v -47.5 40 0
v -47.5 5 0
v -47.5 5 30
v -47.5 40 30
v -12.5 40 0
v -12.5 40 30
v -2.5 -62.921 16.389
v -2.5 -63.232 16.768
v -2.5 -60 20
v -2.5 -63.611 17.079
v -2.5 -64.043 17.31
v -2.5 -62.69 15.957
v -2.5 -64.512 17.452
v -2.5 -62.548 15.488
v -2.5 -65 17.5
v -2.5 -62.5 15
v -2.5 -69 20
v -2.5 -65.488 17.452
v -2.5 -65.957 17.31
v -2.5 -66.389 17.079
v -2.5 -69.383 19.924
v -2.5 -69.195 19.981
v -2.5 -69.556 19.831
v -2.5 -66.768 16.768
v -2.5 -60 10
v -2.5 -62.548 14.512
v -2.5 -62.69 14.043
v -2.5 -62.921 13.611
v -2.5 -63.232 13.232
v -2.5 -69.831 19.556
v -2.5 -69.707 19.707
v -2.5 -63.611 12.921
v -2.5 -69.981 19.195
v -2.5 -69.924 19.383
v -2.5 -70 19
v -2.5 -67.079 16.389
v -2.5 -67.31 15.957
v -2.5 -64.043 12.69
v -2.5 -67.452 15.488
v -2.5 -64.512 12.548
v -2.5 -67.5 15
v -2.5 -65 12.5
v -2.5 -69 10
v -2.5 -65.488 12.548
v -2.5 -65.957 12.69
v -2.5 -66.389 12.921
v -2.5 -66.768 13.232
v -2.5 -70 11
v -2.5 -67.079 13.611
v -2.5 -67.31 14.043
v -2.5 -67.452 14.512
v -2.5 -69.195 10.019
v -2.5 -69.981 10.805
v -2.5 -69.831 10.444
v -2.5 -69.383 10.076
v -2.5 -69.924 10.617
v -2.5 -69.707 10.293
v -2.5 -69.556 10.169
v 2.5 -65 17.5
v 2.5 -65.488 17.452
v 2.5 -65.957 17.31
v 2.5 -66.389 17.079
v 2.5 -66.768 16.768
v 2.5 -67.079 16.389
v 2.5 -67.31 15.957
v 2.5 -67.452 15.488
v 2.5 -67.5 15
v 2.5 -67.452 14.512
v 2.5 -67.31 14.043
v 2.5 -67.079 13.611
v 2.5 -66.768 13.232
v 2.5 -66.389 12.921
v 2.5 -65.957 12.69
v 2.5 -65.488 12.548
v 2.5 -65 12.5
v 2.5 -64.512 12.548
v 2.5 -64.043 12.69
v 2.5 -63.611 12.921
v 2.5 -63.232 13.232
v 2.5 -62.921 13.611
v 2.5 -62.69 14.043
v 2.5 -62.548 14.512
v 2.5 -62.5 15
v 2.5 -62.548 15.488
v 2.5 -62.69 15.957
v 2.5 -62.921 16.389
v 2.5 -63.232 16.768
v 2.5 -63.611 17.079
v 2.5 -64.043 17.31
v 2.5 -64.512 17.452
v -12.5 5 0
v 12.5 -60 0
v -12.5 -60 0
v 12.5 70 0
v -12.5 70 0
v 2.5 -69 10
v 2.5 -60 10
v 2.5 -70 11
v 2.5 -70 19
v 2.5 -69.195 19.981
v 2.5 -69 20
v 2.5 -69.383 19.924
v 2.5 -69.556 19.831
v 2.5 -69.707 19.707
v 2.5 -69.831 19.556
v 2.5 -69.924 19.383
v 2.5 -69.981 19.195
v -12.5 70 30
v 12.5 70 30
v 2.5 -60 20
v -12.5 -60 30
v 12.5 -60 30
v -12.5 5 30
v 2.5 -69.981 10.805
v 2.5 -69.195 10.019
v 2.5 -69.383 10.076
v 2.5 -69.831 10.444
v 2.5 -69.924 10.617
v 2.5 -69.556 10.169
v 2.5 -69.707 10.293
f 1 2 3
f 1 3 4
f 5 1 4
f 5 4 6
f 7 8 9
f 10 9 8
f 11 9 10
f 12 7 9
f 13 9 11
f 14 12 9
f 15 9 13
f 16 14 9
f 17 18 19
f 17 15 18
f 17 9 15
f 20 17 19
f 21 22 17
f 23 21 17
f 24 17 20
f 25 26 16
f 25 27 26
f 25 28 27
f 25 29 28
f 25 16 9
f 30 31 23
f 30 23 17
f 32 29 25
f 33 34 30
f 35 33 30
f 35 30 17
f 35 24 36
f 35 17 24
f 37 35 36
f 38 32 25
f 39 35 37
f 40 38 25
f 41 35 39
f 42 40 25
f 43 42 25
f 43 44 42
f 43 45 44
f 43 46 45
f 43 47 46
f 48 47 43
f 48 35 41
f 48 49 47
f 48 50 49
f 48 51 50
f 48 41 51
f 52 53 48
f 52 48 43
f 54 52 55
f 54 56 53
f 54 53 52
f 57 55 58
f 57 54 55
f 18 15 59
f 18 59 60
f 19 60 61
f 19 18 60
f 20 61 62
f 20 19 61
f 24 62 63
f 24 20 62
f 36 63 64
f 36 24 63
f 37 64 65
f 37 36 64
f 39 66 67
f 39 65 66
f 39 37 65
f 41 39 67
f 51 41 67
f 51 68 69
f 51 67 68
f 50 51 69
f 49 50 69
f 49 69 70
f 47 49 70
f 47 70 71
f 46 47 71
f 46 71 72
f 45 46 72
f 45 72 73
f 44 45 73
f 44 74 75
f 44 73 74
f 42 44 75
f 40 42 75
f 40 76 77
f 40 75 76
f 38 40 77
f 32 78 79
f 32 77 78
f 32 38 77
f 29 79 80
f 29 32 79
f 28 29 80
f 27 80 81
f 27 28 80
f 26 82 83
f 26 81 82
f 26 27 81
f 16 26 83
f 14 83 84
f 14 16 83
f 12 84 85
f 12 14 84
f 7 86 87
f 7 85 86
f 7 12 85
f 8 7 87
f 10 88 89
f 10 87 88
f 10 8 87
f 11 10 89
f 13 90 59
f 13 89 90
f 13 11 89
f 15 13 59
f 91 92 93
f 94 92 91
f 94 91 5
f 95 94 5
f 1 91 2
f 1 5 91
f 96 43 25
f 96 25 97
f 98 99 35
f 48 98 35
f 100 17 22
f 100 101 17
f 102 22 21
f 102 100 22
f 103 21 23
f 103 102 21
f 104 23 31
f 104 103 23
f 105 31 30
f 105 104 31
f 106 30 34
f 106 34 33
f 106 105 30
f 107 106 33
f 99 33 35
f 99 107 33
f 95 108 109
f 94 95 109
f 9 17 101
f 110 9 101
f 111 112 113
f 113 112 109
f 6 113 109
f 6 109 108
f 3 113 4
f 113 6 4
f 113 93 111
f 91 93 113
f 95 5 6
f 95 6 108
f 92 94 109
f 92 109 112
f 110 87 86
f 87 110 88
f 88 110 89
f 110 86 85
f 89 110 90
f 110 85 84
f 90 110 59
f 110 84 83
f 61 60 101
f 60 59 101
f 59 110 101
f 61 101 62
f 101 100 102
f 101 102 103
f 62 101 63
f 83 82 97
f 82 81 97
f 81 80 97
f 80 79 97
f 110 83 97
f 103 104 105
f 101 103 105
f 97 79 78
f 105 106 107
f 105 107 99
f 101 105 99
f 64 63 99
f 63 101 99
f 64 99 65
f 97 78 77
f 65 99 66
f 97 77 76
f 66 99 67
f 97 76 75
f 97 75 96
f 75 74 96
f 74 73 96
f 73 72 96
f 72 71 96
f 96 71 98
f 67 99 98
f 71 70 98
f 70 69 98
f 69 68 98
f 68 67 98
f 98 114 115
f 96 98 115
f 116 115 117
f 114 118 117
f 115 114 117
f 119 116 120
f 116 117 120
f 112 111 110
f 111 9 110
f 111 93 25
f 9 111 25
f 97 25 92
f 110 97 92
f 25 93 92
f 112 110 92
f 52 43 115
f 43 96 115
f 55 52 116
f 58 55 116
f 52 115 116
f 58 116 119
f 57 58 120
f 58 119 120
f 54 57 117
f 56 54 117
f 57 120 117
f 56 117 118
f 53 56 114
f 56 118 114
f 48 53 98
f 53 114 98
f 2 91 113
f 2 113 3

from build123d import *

# Parameters (mm, degrees)
BOSS_EXTRUDE1_DEPTH     = 30
CUT_EXTRUDE1_START      = -70
SKETCH2_W               = 25
SKETCH2_H               = 30
SKETCH2_W_2             = 5
SKETCH2_H_2             = 10
CUT_EXTRUDE1_DEPTH      = 10
CUT_EXTRUDE2_DEPTH      = 10
CUT_EXTRUDE2_DEPTH_BACK = 10
SKETCH3_R               = 2.5
FILLET1_R               = 1


with BuildPart() as part:
    # Sketch1 → Boss-Extrude1 (new body)
    with BuildSketch(Plane.XY):
        Polygon((-12.5, 70), (12.5, 70), (12.5, -70), (-12.5, -70), (-12.5, 5), (-47.5, 5), (-47.5, 40), (-12.5, 40), align=None)
    extrude(amount=BOSS_EXTRUDE1_DEPTH)

    # Sketch2 → Cut-Extrude1 (cut)
    with BuildSketch(Plane(origin=(0, 0, 0), x_dir=(1, 0, 0), z_dir=(0, 1, 0)).offset(CUT_EXTRUDE1_START)):
        with Locations((0, -15)):
            Rectangle(SKETCH2_W, SKETCH2_H)
        with Locations((0, -15)):
            Rectangle(SKETCH2_W_2, SKETCH2_H_2, mode=Mode.SUBTRACT)
    extrude(amount=CUT_EXTRUDE1_DEPTH, mode=Mode.SUBTRACT)

    # Sketch3 → Cut-Extrude2 (cut, two sides: drawn at the far end of the back side and taken through both)
    with BuildSketch(Plane(origin=(0, 0, 0), x_dir=(0, 0, -1), z_dir=(1, 0, 0)).offset(-CUT_EXTRUDE2_DEPTH_BACK)):
        with Locations(Location((-15, -65, 0), (0, 0, 180))):
            Circle(SKETCH3_R)
    extrude(amount=CUT_EXTRUDE2_DEPTH + CUT_EXTRUDE2_DEPTH_BACK, mode=Mode.SUBTRACT)

    # Fillet1
    fillet1_edges = [part.edges().sort_by_distance(p)[0] for p in [
        (0, -70, 10),
        (0, -70, 20),
    ]]
    fillet(fillet1_edges, radius=FILLET1_R)


solid = part.part
